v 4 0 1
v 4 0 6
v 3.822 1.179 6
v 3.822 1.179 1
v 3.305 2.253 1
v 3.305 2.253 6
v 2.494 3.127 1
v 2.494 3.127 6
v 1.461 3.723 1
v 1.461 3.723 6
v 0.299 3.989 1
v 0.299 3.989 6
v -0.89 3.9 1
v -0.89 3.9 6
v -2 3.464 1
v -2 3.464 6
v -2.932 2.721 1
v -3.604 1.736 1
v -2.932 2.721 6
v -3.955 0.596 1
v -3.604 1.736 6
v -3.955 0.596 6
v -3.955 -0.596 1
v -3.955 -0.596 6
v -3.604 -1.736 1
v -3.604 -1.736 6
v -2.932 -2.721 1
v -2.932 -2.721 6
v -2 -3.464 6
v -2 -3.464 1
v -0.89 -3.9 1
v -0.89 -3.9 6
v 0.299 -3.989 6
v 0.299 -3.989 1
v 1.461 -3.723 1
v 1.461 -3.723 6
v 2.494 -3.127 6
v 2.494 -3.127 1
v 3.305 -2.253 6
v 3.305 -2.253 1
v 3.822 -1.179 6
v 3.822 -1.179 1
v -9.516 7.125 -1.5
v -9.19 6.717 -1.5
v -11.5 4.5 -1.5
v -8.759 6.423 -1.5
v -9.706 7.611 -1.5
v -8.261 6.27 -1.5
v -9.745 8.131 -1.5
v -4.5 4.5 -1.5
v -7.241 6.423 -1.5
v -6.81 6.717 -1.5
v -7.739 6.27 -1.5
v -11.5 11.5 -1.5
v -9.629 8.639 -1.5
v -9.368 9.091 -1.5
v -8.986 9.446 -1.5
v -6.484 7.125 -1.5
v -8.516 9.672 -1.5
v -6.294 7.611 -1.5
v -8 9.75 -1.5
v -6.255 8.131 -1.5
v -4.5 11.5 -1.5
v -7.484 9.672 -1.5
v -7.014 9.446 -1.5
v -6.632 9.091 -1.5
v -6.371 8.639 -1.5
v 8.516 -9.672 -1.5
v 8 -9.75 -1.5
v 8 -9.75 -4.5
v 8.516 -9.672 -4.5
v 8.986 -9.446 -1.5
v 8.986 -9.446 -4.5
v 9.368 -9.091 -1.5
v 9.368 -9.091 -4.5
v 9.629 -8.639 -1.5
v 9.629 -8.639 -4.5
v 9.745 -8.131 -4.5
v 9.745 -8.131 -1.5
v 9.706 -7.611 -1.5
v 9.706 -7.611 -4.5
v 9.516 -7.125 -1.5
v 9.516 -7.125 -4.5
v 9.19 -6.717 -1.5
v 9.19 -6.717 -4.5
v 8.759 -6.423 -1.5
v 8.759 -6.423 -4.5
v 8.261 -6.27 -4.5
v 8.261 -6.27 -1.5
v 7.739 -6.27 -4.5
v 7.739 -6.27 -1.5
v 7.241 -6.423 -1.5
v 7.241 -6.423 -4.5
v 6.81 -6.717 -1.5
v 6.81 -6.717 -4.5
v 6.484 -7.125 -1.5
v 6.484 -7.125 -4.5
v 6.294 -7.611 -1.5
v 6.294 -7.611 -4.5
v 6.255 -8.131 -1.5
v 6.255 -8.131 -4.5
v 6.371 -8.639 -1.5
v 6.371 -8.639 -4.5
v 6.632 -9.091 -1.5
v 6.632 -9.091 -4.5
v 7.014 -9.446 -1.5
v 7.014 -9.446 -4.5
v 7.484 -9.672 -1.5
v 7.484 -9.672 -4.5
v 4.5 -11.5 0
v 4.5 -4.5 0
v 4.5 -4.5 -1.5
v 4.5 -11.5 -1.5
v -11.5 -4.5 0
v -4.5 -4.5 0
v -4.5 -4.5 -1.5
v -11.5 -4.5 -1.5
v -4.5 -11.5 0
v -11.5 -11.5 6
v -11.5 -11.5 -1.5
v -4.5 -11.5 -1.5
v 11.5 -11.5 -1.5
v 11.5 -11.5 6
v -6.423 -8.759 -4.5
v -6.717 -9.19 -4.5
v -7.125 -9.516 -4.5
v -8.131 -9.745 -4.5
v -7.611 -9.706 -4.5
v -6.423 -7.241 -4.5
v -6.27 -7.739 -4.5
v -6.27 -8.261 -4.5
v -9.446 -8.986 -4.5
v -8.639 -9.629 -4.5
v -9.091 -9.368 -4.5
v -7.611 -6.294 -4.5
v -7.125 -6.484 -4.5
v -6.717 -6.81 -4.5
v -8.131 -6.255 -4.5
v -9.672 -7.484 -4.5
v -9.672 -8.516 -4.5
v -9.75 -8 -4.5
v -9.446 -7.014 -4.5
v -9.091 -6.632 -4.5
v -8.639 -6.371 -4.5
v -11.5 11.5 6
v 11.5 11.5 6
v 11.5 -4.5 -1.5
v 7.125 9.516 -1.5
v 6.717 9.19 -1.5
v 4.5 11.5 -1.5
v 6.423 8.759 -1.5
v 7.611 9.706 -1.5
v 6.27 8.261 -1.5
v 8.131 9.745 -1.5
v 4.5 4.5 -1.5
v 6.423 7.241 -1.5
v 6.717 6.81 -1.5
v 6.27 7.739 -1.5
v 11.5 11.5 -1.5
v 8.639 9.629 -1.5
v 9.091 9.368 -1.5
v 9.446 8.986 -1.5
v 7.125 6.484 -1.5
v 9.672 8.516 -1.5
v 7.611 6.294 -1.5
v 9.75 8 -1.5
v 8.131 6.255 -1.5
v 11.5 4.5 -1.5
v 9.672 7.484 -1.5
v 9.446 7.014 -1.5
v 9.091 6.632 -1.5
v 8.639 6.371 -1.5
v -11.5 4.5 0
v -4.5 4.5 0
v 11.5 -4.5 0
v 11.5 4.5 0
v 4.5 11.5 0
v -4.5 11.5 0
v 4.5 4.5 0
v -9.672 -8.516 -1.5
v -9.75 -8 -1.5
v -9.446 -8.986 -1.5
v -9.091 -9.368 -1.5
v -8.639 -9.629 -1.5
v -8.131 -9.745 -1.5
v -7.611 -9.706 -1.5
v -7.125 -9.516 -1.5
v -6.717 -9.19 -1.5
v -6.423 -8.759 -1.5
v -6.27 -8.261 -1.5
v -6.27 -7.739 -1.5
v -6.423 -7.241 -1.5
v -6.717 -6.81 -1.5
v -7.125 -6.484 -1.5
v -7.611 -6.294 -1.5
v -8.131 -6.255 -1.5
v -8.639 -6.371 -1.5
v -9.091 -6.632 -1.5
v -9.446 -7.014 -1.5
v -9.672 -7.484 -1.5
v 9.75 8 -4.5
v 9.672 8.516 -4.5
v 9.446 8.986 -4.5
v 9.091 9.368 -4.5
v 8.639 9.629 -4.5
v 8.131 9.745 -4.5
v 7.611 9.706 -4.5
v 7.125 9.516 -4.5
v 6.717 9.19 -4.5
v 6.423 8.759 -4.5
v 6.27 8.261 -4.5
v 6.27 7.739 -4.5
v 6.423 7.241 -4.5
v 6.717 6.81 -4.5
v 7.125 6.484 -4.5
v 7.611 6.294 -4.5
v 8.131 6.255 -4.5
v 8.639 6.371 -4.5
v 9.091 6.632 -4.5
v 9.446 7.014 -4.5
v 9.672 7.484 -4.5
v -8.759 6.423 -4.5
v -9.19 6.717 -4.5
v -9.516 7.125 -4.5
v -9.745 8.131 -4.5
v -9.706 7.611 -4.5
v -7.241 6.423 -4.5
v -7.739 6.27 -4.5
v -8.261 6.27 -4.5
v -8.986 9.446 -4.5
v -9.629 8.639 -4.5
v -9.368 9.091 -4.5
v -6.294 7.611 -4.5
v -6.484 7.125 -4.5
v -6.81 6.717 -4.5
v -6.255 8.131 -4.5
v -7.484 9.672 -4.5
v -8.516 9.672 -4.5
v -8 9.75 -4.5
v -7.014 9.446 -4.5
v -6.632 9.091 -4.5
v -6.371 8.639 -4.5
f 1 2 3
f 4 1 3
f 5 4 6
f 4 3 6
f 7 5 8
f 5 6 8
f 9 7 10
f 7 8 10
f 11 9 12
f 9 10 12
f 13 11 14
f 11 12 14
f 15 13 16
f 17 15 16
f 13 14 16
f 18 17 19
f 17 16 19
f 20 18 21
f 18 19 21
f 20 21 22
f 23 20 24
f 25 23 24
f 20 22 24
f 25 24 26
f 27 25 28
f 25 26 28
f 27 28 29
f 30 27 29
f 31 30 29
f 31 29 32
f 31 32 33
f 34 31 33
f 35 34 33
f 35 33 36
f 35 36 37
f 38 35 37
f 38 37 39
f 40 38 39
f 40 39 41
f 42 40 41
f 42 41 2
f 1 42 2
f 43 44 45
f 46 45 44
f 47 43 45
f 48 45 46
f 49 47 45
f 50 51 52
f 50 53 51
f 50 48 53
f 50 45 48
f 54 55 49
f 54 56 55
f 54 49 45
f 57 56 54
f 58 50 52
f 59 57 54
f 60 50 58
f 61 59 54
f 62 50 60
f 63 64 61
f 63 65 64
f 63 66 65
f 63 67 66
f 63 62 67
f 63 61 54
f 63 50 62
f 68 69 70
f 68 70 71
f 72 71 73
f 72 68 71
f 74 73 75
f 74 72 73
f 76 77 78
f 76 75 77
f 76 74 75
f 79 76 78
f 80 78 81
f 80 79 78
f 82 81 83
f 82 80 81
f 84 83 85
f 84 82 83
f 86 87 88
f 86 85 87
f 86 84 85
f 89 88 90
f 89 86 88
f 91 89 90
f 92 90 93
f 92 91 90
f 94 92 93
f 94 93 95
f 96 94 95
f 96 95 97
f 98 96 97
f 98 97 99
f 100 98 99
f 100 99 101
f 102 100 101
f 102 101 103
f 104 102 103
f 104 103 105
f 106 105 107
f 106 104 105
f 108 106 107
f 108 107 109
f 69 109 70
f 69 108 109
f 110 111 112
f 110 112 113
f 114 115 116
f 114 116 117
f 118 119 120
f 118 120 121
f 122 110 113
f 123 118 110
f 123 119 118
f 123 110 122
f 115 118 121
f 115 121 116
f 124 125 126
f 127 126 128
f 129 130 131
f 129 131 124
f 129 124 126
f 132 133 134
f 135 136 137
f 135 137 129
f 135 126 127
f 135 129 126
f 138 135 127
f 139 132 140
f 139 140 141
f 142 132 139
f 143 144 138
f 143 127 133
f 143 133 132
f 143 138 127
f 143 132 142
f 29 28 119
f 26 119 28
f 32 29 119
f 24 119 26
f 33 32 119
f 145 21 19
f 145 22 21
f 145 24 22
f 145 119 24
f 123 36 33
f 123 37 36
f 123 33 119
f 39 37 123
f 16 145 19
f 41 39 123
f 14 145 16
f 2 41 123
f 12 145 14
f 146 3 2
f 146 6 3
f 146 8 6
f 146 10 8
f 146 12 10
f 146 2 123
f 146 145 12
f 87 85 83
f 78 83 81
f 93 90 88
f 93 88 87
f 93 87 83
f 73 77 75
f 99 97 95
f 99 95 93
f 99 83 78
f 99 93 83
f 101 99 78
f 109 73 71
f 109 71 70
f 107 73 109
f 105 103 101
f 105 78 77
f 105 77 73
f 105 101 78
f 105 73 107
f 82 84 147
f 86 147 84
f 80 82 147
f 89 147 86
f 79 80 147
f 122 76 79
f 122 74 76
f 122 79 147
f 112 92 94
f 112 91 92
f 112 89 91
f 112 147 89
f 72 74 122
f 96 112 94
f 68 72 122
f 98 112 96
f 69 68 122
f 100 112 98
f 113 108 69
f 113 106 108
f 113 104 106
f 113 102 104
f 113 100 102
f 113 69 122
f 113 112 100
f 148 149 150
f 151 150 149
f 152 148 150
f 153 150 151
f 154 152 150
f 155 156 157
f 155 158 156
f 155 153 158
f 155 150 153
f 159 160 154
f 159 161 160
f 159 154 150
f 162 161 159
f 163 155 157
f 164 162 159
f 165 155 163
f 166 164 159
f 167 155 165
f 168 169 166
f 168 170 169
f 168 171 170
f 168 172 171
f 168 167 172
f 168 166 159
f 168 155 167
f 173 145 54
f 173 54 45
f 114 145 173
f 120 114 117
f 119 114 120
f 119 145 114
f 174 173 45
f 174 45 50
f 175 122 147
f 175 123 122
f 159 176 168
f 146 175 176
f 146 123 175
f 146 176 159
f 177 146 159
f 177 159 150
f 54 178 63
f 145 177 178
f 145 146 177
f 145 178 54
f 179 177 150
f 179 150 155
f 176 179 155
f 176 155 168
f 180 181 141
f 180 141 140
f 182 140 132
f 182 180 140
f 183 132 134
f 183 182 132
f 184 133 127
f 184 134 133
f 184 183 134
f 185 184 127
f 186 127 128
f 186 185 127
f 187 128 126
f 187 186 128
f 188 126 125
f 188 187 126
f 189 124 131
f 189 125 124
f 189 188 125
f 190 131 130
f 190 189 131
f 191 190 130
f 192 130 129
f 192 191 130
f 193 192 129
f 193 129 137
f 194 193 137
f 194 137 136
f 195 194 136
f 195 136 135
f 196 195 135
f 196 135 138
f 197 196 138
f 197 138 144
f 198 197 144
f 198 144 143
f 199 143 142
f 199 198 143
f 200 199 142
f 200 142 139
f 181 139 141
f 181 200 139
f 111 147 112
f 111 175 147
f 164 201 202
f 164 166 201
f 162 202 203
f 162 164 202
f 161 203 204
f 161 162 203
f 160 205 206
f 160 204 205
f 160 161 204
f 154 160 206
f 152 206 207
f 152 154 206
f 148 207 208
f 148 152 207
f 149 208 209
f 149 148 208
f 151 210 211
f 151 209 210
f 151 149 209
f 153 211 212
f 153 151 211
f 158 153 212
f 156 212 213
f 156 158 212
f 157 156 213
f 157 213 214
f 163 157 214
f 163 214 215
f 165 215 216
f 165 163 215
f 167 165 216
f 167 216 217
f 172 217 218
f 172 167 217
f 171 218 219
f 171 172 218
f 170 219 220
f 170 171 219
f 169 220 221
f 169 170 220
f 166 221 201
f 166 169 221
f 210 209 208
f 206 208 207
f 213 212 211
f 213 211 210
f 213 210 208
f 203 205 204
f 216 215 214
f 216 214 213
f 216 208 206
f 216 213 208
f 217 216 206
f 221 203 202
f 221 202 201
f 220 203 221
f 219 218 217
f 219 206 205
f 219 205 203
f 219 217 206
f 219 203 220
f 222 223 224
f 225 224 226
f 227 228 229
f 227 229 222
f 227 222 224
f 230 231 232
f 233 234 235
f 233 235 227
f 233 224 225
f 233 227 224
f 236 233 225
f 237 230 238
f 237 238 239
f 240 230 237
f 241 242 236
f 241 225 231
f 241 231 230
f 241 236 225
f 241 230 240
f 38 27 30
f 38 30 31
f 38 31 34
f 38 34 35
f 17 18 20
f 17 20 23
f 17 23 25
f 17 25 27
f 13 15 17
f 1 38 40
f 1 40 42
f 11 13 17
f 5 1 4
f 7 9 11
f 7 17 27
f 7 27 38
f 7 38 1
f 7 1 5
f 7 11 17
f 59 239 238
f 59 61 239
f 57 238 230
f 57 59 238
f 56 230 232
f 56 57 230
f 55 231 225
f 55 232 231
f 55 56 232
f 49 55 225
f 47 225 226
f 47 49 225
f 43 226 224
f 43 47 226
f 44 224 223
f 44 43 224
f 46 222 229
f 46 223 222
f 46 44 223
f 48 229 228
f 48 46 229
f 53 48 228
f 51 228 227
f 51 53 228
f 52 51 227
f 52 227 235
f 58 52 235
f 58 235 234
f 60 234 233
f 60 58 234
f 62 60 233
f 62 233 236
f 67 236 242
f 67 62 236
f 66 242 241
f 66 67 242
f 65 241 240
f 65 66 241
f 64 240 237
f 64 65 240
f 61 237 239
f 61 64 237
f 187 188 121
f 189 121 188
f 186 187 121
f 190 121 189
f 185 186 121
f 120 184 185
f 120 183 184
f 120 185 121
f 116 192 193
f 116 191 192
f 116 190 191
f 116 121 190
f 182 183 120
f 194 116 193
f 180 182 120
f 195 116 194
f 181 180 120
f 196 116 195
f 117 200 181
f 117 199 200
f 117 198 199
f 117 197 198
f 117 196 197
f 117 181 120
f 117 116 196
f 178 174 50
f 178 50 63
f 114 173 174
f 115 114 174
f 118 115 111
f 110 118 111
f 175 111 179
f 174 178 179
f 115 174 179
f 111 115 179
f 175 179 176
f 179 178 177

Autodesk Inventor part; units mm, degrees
ref_plane "YZ Plane" through (0, 0, 0) normal (1, 0, 0) x (0, 1, 0)
ref_plane "XZ Plane" through (0, 0, 0) normal (0, 1, 0) x (-1, 0, 0)
ref_plane "XY Plane" through (0, 0, 0) normal (0, 0, 1) x (1, 0, 0)
sketch "Sketch1" plane through (0, 0, 0) normal (0, 0, 1) x (1, 0, 0)
  line L0 (11.5, -11.5) -> (-11.5, -11.5)
  line L1 (-11.5, -11.5) -> (-11.5, 11.5)
  line L2 (-11.5, 11.5) -> (11.5, 11.5)
  line L3 (11.5, 11.5) -> (11.5, -11.5)
  point P0 (0, 0)
  point P1 (0, 11.5)
  point P2 (-11.5, 0)
  dimension "d0" = 23
extrude "Extrusion1" add sketch "Sketch1" along normal blind 6
sketch "Sketch2" plane through (0, 0, 6) normal (0, 0, 1) x (1, 0, 0)
  circle A0 centre (0, 0) radius 4
  dimension "d3" = 8
extrude "Extrusion2" cut sketch "Sketch2" against normal blind 5
sketch "Sketch3" plane through (0, 0, 0) normal (0, 0, -1) x (-1, 0, 0)
  line L0 (11.5, 11.5) -> (11.5, -11.5) projected
  line L1 (11.5, -11.5) -> (4.5, -11.5)
  line L2 (4.5, -11.5) -> (4.5, -4.5)
  line L3 (4.5, -4.5) -> (11.5, -4.5)
  line L4 (11.5, -4.5) -> (11.5, -11.5)
  circle A0 centre (8, -8) radius 1.75
  point P0 (0, 0)
  dimension "d6" = 3.5
  dimension "d7" = 7
  dimension "d8" = 8
  dimension "d9" = 8
extrude "Extrusion3" add sketch "Sketch3" along normal blind 1.5
extrude "Extrusion4" add sketch "Sketch3" along normal blind 4.5 contours A0
pattern_circular "Circular Pattern1" count 4 over 360 about axis through (0, 0, -10) along (0, 0, 1) of "Extrusion3", "Extrusion4"
equation "\"d9\" = d8"
properties part number "AS5600 Testteil"
